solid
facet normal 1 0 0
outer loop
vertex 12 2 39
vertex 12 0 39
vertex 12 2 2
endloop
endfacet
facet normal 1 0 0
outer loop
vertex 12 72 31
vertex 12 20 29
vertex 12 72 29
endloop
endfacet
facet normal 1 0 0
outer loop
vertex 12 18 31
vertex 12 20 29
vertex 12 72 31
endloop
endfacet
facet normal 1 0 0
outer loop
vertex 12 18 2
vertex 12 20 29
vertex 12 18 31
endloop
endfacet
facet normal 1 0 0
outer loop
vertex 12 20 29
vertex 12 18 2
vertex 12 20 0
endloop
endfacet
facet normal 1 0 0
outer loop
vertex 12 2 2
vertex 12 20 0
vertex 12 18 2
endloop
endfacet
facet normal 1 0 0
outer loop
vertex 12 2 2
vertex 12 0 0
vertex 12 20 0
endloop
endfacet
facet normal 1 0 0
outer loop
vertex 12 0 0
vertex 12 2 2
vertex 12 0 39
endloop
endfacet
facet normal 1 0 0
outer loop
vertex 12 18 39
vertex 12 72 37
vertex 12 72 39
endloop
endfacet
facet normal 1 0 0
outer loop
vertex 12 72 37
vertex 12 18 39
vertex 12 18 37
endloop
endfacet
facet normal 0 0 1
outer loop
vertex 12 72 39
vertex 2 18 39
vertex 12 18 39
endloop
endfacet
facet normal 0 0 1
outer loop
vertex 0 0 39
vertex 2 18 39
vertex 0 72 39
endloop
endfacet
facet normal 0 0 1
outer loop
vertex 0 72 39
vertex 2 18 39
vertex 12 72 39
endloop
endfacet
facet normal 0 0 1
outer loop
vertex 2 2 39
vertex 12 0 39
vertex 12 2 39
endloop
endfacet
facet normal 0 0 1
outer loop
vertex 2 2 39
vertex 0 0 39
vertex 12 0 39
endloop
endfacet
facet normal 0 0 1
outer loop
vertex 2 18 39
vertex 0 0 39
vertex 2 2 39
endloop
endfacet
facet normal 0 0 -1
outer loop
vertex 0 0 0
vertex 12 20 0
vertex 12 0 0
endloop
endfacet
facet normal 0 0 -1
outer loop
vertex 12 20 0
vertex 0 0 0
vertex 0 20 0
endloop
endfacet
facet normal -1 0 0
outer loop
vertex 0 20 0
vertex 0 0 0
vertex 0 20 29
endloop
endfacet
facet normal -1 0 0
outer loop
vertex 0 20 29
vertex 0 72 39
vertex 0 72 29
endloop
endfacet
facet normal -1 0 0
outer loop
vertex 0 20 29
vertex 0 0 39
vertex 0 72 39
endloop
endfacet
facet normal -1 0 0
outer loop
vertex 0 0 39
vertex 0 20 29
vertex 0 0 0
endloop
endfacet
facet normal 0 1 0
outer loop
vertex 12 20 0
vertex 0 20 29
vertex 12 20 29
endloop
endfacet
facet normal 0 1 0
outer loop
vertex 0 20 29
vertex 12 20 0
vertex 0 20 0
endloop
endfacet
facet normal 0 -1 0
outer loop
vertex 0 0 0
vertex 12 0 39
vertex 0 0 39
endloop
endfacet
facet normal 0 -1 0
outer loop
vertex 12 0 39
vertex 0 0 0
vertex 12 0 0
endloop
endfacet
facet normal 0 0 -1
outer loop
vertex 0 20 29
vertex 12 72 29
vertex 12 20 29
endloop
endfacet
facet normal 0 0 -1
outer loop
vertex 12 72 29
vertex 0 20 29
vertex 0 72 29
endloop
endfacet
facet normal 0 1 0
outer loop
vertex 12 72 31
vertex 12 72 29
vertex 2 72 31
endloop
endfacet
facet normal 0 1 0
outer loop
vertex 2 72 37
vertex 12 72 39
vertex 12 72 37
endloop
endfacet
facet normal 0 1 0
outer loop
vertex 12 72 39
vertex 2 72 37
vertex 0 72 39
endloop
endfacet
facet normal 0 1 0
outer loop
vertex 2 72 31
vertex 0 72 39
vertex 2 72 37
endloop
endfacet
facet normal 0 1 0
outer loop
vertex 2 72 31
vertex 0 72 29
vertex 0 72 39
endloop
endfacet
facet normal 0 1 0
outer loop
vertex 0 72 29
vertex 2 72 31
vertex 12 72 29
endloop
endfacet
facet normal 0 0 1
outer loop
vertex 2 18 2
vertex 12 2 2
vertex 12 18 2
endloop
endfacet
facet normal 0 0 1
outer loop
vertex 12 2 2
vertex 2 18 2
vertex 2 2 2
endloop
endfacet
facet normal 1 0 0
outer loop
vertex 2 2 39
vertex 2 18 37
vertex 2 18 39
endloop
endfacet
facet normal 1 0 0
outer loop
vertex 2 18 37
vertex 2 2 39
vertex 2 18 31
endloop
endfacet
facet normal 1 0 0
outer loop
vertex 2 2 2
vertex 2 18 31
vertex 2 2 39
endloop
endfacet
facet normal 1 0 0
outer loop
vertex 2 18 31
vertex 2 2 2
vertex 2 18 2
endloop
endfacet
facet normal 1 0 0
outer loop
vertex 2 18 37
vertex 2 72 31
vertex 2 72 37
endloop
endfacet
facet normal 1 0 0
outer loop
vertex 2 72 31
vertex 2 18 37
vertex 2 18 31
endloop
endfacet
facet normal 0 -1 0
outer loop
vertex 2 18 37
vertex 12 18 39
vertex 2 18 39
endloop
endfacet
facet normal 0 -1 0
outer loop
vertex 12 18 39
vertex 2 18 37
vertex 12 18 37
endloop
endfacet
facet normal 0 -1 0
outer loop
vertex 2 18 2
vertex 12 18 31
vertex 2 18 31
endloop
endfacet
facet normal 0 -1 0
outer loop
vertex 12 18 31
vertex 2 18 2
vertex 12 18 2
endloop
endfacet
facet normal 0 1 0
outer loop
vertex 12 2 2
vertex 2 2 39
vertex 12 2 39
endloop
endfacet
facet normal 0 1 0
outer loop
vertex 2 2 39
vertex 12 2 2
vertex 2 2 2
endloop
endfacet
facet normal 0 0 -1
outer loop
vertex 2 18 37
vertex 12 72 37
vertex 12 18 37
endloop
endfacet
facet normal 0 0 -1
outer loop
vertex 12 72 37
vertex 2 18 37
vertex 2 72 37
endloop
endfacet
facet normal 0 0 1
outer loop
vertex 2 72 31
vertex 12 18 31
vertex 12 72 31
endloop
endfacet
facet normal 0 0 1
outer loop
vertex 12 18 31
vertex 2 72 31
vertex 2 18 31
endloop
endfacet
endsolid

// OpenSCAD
phone_t = 16;
phone_l = 35;
case_t = 6;
case_l = 70;
w=2;
width = 10;


difference(){
union(){
   cube([width+w,phone_t+w*2,phone_l+w*2]);
   translate([0,0,phone_l-case_t])
   cube([width+w,case_l+w,case_t+w*2]);
}
translate([w,w,w])
union(){
   cube([width,phone_t,phone_l+w]);
   translate([0,0,phone_l-case_t])
   cube([width,case_l,case_t]);
}
}
